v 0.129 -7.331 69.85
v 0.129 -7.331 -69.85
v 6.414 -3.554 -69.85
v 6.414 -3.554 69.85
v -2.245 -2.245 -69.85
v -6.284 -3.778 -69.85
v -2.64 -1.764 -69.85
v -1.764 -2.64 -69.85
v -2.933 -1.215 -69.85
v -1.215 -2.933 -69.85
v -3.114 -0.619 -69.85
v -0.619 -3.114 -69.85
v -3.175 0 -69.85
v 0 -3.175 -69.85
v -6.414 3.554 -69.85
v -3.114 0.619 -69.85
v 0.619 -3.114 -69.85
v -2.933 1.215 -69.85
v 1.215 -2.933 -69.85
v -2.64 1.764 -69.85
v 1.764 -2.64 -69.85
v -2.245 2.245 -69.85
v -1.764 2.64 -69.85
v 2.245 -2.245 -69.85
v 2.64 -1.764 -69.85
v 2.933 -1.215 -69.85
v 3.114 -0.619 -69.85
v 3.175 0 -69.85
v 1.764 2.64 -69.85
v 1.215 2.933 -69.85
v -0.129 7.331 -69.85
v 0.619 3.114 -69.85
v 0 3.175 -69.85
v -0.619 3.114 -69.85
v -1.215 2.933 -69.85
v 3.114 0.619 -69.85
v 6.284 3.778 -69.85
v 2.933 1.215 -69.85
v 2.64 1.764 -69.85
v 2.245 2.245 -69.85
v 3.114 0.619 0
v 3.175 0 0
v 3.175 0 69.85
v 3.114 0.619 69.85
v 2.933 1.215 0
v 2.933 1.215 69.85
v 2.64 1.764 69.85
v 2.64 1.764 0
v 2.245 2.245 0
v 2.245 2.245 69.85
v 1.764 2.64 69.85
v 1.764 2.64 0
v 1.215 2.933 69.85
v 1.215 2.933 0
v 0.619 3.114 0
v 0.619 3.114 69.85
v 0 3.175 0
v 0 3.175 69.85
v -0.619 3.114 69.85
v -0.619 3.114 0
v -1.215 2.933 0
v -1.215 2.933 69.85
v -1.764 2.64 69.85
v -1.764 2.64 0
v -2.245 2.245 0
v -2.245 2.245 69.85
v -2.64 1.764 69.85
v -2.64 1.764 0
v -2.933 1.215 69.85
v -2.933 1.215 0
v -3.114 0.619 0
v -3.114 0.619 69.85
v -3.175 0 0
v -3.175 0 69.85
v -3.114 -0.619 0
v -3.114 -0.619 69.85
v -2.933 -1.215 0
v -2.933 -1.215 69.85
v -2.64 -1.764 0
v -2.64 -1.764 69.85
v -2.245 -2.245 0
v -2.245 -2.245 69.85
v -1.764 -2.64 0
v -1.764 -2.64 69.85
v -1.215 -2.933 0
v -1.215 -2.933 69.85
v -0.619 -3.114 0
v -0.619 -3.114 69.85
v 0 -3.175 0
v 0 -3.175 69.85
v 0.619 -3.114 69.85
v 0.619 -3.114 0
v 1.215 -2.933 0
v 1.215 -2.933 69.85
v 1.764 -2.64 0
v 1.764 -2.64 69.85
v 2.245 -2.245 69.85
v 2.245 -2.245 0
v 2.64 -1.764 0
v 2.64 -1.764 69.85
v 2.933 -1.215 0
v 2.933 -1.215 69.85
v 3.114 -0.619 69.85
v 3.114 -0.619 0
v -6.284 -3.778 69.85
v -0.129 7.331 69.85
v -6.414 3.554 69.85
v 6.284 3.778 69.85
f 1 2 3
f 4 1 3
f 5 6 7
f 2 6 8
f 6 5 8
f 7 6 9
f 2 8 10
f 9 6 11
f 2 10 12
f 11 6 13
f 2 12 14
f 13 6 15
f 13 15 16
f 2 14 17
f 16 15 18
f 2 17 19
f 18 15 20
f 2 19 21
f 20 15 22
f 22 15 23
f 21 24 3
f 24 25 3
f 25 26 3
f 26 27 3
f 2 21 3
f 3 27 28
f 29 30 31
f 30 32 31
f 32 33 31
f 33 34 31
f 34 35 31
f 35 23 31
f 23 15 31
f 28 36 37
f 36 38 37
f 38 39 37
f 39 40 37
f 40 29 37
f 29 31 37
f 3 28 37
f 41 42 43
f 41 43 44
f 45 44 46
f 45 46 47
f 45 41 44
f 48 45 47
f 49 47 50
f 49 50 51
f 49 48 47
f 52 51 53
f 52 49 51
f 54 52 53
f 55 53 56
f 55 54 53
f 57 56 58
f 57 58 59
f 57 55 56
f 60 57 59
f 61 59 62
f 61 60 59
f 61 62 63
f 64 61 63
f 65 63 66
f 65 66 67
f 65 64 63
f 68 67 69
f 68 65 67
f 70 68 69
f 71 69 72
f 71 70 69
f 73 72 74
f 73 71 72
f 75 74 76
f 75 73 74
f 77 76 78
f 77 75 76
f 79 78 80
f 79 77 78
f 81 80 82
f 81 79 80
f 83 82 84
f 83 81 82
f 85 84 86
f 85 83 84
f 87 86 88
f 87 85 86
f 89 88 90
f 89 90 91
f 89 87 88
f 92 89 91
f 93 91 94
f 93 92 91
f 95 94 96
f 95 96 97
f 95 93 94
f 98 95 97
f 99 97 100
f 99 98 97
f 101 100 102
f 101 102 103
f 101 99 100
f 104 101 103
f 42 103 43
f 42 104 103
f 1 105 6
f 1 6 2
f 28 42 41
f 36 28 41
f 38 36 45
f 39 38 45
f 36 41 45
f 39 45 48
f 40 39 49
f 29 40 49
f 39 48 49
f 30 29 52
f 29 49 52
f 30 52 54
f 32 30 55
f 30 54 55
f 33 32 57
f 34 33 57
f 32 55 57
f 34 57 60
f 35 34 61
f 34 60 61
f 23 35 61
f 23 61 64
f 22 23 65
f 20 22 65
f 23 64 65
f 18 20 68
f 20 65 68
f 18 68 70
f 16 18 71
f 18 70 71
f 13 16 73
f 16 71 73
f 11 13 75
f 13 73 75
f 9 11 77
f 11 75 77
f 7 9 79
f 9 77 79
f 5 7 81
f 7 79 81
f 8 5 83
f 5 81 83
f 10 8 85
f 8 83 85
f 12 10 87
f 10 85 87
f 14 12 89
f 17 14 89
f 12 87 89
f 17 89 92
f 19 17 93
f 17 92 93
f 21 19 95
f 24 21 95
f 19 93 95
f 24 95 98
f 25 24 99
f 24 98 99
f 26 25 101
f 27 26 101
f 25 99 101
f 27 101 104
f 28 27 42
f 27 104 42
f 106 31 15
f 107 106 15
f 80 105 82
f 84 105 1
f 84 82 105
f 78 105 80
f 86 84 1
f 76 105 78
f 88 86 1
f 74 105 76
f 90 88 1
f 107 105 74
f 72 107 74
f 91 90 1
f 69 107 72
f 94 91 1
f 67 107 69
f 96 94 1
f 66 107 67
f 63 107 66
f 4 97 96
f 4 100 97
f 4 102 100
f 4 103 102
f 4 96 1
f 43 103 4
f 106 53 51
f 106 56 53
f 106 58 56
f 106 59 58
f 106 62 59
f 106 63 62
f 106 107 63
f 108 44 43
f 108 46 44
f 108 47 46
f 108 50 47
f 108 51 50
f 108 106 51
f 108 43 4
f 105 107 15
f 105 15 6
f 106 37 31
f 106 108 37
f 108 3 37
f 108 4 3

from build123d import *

# Parameters (mm, degrees)
BOSS_EXTRUDE1_DEPTH      = 69.85
BOSS_EXTRUDE1_DEPTH_BACK = 69.85
SKETCH1_R                = 3.175


with BuildPart() as part:
    # Sketch1 → Boss-Extrude1 (new, two sides: drawn at the far end of the back side and taken through both)
    with BuildSketch(Plane.XY.offset(-BOSS_EXTRUDE1_DEPTH_BACK)):
        Polygon((6.284319593, 3.777652789), (-0.129383485, 7.331206807), (-6.413703078, 3.553554018), (-6.284319593, -3.777652789), (0.129383485, -7.331206807), (6.413703078, -3.553554018), align=None)
        Circle(SKETCH1_R, mode=Mode.SUBTRACT)
    extrude(amount=BOSS_EXTRUDE1_DEPTH + BOSS_EXTRUDE1_DEPTH_BACK)


solid = part.part
